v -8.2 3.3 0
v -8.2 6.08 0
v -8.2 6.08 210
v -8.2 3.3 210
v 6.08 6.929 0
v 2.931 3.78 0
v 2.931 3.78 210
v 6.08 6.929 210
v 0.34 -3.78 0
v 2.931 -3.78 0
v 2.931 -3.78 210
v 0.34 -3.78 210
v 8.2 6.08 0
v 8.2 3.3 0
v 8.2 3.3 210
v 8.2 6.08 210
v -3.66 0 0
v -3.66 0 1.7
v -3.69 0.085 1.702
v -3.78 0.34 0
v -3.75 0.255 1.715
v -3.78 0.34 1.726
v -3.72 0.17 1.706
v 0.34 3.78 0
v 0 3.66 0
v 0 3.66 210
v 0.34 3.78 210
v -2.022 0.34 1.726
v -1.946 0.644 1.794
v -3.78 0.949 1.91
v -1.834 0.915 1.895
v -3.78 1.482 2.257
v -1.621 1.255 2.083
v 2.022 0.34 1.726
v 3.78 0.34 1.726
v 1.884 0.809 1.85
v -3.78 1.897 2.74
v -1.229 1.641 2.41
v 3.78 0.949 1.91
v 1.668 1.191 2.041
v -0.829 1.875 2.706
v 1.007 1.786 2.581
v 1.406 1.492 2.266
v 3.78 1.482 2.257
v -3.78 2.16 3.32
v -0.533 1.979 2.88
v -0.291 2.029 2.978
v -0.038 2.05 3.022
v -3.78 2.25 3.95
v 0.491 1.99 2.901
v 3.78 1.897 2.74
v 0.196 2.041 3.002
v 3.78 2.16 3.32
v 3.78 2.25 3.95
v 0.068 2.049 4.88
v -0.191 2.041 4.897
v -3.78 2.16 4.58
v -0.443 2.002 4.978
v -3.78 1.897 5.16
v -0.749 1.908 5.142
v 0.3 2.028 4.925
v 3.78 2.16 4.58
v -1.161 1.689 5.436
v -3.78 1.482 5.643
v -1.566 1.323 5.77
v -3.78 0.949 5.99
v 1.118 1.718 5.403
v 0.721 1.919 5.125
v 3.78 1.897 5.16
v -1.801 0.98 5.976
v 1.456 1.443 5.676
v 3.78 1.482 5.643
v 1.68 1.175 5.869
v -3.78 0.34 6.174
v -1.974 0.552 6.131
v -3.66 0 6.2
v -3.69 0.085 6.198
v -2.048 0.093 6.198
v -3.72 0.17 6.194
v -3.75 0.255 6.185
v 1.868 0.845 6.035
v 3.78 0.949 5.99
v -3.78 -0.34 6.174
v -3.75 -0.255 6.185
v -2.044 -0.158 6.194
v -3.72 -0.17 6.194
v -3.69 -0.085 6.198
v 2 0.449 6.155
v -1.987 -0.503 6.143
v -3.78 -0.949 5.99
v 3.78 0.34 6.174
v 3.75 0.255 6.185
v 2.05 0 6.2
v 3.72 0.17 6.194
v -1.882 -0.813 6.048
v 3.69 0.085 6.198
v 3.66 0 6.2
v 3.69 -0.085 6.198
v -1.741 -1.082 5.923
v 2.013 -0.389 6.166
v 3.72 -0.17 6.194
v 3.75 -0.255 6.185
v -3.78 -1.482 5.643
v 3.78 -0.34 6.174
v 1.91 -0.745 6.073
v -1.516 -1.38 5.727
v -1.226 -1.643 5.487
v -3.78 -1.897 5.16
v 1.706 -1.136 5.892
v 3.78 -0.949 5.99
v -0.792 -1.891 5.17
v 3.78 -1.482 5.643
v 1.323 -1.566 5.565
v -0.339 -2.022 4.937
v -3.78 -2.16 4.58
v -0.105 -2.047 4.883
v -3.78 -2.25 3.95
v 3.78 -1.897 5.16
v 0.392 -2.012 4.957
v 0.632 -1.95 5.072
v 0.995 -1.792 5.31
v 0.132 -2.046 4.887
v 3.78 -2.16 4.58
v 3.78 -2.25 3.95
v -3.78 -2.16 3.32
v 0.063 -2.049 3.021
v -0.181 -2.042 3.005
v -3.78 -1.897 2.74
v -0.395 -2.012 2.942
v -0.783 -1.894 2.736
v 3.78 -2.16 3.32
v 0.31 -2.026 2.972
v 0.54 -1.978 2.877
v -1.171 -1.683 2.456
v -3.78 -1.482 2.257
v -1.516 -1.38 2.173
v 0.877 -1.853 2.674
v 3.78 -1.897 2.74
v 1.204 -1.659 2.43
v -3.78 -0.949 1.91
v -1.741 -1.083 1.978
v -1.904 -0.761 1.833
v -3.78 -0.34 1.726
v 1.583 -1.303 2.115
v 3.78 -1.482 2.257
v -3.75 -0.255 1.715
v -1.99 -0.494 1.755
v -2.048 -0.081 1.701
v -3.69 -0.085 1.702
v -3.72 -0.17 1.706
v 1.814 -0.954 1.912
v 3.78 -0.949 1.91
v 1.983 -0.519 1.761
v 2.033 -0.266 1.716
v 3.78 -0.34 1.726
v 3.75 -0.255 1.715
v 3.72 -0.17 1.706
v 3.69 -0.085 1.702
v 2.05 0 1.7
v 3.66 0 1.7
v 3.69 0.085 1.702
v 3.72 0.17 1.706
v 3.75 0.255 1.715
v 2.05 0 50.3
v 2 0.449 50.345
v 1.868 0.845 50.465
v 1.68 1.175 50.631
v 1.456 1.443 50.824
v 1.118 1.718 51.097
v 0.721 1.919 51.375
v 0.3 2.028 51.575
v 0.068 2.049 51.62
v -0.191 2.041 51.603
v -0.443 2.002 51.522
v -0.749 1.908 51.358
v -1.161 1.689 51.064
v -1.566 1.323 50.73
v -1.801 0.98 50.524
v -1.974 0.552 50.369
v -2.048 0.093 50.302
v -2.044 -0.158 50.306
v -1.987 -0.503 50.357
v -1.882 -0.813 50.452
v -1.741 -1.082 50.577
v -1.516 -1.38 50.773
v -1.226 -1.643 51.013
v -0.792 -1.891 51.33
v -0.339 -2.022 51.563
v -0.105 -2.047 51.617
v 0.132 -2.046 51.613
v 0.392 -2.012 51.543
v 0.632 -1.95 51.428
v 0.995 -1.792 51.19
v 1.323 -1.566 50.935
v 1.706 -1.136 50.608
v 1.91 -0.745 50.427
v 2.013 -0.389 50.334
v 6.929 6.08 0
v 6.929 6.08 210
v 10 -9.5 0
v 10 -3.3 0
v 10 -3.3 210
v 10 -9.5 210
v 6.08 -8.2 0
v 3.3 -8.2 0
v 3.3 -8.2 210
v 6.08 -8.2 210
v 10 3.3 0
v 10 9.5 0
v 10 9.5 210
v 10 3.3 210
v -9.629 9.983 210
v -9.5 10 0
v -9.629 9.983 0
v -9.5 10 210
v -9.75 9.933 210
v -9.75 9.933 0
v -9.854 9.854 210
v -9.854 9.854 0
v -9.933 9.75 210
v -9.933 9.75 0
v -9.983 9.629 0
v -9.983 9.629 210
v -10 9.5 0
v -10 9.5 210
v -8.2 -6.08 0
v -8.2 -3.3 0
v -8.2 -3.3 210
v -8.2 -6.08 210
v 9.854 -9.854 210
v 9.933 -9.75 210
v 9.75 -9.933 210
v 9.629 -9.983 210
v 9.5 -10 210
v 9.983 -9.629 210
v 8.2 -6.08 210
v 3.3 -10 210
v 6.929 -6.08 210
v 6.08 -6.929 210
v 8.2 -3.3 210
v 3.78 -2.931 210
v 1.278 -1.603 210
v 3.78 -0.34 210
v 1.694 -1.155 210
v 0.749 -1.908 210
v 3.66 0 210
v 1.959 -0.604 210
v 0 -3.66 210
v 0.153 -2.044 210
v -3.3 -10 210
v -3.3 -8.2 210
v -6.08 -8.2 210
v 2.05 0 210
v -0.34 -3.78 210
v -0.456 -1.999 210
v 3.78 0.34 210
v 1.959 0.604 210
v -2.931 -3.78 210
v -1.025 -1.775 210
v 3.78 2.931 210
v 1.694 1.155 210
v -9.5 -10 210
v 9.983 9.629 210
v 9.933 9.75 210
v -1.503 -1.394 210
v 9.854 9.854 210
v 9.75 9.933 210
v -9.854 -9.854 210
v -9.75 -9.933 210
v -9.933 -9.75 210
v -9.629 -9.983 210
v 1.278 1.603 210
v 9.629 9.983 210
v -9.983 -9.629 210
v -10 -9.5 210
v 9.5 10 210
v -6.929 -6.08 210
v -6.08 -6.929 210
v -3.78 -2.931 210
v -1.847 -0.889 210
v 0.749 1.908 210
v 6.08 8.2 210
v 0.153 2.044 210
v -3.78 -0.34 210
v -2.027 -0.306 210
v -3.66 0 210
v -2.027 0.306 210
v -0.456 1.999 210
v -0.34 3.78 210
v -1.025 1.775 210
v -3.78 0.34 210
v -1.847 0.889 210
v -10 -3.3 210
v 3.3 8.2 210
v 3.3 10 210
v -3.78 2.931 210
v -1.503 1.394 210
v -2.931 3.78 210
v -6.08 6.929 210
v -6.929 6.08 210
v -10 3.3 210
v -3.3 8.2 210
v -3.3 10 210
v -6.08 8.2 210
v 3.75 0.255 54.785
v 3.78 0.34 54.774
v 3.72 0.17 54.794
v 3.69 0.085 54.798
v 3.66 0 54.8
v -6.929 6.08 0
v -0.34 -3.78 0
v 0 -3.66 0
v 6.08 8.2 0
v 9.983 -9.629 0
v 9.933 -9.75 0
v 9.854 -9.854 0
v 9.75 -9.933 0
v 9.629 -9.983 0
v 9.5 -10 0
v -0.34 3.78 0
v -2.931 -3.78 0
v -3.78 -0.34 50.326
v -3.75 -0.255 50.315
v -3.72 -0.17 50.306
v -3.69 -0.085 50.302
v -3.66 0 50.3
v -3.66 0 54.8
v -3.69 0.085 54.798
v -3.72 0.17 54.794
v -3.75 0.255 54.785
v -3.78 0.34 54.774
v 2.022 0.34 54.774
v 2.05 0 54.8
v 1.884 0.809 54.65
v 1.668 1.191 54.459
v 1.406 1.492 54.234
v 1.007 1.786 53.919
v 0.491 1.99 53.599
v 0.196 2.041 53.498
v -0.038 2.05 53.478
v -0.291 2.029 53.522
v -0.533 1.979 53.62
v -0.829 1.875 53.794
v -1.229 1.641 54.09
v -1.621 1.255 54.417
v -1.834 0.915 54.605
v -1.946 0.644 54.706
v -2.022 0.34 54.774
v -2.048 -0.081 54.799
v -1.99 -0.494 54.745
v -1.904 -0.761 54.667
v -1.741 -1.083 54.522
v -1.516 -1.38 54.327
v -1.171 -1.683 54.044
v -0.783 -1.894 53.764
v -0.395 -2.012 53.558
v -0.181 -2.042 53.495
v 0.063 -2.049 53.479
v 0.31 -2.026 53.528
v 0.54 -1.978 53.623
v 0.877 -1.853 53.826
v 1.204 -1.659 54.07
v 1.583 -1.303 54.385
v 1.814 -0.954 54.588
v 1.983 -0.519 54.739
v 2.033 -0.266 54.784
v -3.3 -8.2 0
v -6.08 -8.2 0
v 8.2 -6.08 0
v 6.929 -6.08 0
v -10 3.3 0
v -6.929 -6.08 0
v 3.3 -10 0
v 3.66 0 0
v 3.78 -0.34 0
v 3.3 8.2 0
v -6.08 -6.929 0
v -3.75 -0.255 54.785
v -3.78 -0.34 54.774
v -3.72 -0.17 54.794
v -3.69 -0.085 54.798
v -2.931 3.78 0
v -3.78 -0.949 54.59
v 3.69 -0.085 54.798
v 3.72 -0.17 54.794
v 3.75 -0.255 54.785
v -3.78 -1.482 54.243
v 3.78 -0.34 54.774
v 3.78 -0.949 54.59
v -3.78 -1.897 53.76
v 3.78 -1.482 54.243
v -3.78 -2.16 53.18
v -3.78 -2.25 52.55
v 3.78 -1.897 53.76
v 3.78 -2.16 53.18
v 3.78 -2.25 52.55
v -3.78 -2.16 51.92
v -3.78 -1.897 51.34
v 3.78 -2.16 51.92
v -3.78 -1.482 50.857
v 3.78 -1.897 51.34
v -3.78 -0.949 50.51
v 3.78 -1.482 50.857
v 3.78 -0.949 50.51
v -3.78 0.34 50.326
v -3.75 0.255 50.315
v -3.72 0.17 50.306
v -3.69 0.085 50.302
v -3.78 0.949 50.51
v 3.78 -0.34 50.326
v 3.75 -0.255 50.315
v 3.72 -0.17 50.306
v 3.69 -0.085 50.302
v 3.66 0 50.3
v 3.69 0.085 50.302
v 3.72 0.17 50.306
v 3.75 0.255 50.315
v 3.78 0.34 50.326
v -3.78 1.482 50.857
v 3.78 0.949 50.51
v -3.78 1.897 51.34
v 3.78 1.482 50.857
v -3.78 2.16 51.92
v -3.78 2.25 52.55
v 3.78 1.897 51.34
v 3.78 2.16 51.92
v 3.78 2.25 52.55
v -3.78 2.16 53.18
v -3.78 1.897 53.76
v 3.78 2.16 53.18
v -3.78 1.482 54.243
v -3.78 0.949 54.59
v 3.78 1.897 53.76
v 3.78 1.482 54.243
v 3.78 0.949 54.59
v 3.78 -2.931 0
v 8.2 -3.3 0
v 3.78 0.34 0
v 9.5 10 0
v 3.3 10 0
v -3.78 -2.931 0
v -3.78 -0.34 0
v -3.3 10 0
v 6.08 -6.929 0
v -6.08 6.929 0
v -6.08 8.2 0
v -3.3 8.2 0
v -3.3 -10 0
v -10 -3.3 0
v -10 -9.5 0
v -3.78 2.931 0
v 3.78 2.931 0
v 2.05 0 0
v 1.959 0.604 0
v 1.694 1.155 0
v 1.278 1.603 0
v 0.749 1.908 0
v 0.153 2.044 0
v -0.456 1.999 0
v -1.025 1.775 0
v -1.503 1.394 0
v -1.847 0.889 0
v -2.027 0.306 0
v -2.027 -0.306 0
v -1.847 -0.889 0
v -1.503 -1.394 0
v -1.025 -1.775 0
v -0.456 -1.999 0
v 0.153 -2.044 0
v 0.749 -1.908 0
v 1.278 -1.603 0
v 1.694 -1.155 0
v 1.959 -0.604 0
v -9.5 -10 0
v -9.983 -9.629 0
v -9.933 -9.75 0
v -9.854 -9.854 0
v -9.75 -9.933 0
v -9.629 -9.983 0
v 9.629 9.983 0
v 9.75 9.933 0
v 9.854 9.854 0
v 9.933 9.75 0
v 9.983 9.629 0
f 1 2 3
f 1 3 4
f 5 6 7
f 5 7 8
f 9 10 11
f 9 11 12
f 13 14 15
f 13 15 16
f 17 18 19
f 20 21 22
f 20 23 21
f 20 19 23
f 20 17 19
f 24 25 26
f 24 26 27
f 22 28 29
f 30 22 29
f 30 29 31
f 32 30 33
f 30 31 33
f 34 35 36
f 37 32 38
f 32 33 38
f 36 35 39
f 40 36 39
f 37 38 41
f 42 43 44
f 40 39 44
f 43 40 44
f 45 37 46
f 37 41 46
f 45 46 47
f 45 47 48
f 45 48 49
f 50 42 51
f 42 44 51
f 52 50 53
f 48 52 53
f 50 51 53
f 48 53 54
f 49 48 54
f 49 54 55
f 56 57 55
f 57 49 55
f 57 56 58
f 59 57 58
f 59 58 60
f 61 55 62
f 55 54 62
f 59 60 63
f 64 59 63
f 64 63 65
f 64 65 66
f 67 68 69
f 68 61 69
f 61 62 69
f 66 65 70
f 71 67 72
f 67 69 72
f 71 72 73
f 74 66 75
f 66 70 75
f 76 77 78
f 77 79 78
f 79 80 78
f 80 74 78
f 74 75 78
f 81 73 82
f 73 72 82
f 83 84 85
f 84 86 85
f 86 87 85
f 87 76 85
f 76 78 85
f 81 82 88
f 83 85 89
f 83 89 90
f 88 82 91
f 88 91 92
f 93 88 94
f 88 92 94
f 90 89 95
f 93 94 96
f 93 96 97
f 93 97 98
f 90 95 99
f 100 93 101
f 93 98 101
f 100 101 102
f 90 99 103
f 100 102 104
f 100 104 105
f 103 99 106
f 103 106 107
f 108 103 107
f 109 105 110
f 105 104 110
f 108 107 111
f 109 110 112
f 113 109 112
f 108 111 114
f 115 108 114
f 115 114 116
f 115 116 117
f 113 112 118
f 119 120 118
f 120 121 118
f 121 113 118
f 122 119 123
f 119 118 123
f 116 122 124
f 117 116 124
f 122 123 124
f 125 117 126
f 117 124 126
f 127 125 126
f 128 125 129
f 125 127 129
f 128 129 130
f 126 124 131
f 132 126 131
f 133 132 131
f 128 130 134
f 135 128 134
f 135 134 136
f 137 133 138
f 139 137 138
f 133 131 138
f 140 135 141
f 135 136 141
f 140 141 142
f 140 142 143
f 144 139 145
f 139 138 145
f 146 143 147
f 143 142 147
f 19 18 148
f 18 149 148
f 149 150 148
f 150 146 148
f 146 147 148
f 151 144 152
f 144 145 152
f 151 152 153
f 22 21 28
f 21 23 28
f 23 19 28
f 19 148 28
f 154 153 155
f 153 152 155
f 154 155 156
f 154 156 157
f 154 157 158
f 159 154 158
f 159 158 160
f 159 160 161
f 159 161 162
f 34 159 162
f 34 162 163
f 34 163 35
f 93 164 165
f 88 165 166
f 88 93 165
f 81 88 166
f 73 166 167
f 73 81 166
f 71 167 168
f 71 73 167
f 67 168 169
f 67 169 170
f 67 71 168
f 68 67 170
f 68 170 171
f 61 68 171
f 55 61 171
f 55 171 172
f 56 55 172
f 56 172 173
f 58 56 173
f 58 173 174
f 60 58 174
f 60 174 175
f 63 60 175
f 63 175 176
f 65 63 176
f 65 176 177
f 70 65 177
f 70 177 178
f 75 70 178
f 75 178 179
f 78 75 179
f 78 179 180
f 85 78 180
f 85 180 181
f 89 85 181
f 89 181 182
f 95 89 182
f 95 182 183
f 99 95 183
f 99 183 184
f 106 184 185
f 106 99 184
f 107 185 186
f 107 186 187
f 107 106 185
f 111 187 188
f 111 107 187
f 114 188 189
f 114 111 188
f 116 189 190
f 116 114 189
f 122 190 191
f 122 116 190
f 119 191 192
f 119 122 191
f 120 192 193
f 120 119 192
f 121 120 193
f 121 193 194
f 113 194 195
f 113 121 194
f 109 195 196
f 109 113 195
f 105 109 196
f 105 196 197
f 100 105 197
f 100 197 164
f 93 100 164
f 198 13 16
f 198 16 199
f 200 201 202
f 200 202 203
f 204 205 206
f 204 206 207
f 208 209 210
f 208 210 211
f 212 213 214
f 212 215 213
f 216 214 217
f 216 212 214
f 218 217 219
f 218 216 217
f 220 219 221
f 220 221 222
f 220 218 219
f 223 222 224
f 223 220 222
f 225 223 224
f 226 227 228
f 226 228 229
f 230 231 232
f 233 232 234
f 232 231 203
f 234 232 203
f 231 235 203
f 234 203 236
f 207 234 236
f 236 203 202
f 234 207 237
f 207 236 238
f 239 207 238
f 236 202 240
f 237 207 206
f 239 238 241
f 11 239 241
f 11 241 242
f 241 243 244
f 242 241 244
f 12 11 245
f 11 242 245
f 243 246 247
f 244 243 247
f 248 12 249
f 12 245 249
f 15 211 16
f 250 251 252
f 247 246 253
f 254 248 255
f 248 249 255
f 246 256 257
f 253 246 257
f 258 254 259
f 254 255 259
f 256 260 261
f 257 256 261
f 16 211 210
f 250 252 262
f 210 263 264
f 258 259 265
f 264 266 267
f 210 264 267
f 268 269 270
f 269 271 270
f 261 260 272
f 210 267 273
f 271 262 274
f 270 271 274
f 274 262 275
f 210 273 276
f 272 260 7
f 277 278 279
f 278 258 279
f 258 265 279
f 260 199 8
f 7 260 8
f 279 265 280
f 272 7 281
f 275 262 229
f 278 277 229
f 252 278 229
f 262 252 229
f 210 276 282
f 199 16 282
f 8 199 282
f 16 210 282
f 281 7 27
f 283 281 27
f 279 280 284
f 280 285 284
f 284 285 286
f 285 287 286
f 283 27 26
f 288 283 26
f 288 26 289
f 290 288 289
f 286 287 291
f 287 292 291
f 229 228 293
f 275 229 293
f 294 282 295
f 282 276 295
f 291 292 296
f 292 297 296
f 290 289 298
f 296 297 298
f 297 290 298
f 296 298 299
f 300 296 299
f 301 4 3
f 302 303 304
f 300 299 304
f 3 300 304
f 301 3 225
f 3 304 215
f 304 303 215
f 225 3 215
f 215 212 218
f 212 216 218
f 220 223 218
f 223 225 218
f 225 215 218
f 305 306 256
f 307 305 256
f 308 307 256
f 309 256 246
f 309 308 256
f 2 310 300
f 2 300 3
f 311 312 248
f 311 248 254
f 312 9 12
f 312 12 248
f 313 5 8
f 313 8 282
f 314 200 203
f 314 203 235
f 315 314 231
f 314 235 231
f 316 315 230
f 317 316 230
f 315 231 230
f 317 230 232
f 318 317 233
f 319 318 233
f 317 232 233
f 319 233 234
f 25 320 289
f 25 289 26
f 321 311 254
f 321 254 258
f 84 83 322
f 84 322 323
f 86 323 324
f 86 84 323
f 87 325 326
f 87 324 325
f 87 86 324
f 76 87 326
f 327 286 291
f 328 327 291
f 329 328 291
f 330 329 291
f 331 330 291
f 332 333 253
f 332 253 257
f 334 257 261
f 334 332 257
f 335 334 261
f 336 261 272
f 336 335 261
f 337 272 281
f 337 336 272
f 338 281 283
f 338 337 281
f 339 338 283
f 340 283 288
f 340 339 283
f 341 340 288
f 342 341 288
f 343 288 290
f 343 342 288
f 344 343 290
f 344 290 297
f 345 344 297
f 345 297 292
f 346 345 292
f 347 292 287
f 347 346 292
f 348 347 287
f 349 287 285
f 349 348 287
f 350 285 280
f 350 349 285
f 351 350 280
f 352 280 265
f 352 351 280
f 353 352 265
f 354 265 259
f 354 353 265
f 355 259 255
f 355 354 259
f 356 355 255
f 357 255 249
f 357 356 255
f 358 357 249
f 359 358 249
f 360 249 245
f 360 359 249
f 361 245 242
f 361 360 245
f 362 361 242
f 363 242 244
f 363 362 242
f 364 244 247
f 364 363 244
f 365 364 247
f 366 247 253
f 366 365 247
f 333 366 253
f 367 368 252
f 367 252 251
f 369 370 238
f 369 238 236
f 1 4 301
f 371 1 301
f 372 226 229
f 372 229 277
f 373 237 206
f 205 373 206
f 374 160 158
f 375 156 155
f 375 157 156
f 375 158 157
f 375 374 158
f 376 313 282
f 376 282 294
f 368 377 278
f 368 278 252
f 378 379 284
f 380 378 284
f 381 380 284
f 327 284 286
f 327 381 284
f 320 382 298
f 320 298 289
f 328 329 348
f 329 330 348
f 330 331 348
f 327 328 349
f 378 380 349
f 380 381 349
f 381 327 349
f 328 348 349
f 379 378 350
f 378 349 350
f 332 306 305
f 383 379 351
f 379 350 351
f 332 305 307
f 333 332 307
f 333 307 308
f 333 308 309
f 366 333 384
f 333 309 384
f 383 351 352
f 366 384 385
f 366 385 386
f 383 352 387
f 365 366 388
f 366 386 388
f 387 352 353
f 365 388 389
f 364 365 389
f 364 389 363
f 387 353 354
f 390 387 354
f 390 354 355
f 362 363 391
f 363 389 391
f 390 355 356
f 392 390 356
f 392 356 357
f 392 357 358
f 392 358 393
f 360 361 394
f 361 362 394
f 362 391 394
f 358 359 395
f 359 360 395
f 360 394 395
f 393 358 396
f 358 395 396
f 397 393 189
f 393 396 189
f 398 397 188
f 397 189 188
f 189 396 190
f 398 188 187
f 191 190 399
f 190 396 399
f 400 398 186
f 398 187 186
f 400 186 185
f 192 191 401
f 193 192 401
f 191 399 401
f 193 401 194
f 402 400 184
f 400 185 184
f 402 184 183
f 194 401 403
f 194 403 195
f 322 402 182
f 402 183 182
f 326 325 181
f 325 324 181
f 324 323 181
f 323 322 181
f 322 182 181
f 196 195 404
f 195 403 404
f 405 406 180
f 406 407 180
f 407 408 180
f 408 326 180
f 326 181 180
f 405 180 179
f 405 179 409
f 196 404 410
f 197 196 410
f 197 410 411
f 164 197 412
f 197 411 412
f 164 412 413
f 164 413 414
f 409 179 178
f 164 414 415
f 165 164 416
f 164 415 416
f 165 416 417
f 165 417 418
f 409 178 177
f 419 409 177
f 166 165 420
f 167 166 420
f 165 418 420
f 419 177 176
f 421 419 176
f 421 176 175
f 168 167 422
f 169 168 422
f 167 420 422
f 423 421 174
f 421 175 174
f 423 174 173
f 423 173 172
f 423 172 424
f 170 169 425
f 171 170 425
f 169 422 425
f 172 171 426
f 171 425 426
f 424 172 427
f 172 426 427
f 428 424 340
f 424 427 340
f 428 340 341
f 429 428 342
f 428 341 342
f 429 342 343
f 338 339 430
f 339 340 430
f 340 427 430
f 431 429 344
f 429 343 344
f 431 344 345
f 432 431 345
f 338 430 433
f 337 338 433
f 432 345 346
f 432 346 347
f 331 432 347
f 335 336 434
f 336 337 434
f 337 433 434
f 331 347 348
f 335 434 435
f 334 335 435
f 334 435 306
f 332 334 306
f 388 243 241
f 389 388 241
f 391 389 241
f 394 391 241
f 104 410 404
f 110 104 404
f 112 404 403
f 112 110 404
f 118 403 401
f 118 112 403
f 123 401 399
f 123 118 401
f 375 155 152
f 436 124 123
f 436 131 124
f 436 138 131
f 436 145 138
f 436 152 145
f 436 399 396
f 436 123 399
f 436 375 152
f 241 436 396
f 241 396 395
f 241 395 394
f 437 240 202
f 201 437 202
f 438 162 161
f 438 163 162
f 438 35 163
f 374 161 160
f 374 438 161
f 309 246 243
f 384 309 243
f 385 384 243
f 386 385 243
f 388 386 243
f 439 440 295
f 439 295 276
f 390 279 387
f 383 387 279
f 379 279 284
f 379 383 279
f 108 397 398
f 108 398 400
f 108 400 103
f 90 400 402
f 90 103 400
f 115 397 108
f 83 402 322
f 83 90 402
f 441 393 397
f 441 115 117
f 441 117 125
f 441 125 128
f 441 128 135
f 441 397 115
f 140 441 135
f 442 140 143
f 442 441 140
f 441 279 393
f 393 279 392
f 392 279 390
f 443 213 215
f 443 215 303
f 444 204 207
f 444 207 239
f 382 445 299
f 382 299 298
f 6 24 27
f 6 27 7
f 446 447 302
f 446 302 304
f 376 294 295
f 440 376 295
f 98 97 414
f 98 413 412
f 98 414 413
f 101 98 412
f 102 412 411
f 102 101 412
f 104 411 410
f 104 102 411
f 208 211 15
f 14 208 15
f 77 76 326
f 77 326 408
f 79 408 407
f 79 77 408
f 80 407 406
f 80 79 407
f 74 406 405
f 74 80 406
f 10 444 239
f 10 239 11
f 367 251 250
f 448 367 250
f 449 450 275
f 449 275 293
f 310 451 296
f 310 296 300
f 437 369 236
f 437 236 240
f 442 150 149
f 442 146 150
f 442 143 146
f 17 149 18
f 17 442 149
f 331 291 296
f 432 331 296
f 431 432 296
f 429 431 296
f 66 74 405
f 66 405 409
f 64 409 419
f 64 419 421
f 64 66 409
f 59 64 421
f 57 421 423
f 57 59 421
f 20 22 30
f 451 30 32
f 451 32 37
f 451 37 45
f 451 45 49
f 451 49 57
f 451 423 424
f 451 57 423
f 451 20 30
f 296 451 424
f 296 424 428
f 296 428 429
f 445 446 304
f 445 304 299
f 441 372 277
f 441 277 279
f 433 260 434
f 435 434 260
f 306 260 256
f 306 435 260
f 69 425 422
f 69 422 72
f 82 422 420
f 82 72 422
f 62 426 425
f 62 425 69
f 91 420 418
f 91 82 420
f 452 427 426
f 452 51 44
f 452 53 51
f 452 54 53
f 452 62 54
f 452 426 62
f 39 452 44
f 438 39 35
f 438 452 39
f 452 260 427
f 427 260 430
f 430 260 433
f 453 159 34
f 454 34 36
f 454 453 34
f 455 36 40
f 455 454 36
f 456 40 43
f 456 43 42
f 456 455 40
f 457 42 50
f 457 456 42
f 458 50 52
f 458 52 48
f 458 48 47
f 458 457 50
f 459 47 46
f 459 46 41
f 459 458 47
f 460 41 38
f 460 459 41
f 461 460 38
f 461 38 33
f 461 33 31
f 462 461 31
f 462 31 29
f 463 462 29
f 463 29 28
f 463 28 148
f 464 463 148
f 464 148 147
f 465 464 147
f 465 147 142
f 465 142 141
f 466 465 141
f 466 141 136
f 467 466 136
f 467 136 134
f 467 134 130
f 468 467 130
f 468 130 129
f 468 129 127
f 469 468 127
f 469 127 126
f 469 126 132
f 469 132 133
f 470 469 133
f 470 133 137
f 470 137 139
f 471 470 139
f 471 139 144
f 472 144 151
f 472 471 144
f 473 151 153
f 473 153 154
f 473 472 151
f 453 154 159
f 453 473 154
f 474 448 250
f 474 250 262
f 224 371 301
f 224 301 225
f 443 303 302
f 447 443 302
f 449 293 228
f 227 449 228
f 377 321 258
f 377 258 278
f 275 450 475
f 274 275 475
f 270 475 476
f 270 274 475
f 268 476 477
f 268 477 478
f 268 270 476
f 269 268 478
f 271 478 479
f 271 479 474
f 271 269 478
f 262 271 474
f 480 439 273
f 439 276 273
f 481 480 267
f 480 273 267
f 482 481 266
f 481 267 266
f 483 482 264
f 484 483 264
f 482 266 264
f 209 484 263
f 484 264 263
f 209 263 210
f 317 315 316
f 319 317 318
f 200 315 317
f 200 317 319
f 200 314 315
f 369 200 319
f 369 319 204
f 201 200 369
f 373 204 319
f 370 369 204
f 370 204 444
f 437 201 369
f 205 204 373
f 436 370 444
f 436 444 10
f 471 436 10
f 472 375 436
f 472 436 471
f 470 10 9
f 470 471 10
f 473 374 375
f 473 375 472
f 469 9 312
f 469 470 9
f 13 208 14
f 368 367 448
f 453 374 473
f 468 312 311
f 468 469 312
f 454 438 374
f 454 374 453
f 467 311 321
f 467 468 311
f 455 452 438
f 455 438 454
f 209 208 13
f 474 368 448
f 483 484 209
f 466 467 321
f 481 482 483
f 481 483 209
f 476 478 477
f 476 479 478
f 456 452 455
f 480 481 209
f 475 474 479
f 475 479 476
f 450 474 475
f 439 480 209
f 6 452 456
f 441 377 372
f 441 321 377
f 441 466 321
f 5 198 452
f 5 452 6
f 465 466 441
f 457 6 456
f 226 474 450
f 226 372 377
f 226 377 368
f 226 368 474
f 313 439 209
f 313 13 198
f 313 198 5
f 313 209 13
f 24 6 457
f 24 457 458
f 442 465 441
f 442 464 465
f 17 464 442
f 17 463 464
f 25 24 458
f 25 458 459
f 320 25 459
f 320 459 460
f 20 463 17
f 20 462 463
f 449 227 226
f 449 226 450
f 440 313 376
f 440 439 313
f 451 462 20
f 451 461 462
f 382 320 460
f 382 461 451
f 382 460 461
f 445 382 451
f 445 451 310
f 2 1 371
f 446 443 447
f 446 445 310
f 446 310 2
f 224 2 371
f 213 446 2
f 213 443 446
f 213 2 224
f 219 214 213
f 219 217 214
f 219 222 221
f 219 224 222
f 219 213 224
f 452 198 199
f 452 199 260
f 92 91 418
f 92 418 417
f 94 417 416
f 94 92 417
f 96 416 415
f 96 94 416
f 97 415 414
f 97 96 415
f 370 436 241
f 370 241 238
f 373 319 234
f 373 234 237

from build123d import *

# Parameters (mm, degrees)
SKETCH1_R           = 2.05
BOSS_EXTRUDE1_DEPTH = 210
FILLET1_R           = 0.5
CUT_EXTRUDE1_REACH  = 212.689
SKETCH2_R           = 2.25


with BuildPart() as part:
    # Sketch1 → Boss-Extrude1 (new body)
    with BuildSketch(Plane.XY):
        Polygon((-3.3, 10), (-3.3, 8.2), (-6.08, 8.2), (-6.08, 6.928528137), (-2.931471863, 3.78), (-0.34, 3.78), (0, 3.66), (0.34, 3.78), (2.931471863, 3.78), (6.08, 6.928528137), (6.08, 8.2), (3.3, 8.2), (3.3, 10), (10, 10), (10, 3.3), (8.2, 3.3), (8.2, 6.08), (6.928528137, 6.08), (3.78, 2.931471863), (3.78, 0.34), (3.66, 0), (3.78, -0.34), (3.78, -2.931471863), (6.928528137, -6.08), (8.2, -6.08), (8.2, -3.3), (10, -3.3), (10, -10), (3.3, -10), (3.3, -8.2), (6.08, -8.2), (6.08, -6.928528137), (2.931471863, -3.78), (0.34, -3.78), (0, -3.66), (-0.34, -3.78), (-2.931471863, -3.78), (-6.08, -6.928528137), (-6.08, -8.2), (-3.3, -8.2), (-3.3, -10), (-10, -10), (-10, -3.3), (-8.2, -3.3), (-8.2, -6.08), (-6.928528137, -6.08), (-3.78, -2.931471863), (-3.78, -0.34), (-3.66, 0), (-3.78, 0.34), (-3.78, 2.931471863), (-6.928528137, 6.08), (-8.2, 6.08), (-8.2, 3.3), (-10, 3.3), (-10, 10), align=None)
        Circle(SKETCH1_R, mode=Mode.SUBTRACT)
    extrude(amount=BOSS_EXTRUDE1_DEPTH)

    # Fillet1
    fillet1_edges = [part.edges().sort_by_distance(p)[0] for p in [
        (10, 10, 105),
        (10, -10, 105),
        (-10, -10, 105),
        (-10, 10, 105),
    ]]
    fillet(fillet1_edges, radius=FILLET1_R)

    # Sketch2 → Cut-Extrude1 (cut, up to next)
    with BuildSketch(Plane(origin=(3.78, 0, 0), x_dir=(0, 0, -1), z_dir=(1, 0, 0)), mode=Mode.PRIVATE) as cut_extrude1_sk1:
        with Locations(Location((-3.95, 0, 0), (0, 0, 8.691322554))):
            Circle(SKETCH2_R)
    cut_extrude1_tool1 = extrude(cut_extrude1_sk1.sketch, amount=-CUT_EXTRUDE1_REACH, mode=Mode.PRIVATE) & part.part
    # Sketch2 → Cut-Extrude1 (cut, up to next)
    with BuildSketch(Plane(origin=(3.78, 0, 0), x_dir=(0, 0, -1), z_dir=(1, 0, 0)), mode=Mode.PRIVATE) as cut_extrude1_sk2:
        with Locations(Location((-52.55, 0, 0), (0, 0, 171.308677446))):
            Circle(SKETCH2_R)
    cut_extrude1_tool2 = extrude(cut_extrude1_sk2.sketch, amount=-CUT_EXTRUDE1_REACH, mode=Mode.PRIVATE) & part.part
    add(cut_extrude1_tool1.solids().sort_by_distance((3.78, 0, 3.95))[0], mode=Mode.SUBTRACT)
    add(cut_extrude1_tool2.solids().sort_by_distance((3.78, 0, 52.55))[0], mode=Mode.SUBTRACT)


solid = part.part
